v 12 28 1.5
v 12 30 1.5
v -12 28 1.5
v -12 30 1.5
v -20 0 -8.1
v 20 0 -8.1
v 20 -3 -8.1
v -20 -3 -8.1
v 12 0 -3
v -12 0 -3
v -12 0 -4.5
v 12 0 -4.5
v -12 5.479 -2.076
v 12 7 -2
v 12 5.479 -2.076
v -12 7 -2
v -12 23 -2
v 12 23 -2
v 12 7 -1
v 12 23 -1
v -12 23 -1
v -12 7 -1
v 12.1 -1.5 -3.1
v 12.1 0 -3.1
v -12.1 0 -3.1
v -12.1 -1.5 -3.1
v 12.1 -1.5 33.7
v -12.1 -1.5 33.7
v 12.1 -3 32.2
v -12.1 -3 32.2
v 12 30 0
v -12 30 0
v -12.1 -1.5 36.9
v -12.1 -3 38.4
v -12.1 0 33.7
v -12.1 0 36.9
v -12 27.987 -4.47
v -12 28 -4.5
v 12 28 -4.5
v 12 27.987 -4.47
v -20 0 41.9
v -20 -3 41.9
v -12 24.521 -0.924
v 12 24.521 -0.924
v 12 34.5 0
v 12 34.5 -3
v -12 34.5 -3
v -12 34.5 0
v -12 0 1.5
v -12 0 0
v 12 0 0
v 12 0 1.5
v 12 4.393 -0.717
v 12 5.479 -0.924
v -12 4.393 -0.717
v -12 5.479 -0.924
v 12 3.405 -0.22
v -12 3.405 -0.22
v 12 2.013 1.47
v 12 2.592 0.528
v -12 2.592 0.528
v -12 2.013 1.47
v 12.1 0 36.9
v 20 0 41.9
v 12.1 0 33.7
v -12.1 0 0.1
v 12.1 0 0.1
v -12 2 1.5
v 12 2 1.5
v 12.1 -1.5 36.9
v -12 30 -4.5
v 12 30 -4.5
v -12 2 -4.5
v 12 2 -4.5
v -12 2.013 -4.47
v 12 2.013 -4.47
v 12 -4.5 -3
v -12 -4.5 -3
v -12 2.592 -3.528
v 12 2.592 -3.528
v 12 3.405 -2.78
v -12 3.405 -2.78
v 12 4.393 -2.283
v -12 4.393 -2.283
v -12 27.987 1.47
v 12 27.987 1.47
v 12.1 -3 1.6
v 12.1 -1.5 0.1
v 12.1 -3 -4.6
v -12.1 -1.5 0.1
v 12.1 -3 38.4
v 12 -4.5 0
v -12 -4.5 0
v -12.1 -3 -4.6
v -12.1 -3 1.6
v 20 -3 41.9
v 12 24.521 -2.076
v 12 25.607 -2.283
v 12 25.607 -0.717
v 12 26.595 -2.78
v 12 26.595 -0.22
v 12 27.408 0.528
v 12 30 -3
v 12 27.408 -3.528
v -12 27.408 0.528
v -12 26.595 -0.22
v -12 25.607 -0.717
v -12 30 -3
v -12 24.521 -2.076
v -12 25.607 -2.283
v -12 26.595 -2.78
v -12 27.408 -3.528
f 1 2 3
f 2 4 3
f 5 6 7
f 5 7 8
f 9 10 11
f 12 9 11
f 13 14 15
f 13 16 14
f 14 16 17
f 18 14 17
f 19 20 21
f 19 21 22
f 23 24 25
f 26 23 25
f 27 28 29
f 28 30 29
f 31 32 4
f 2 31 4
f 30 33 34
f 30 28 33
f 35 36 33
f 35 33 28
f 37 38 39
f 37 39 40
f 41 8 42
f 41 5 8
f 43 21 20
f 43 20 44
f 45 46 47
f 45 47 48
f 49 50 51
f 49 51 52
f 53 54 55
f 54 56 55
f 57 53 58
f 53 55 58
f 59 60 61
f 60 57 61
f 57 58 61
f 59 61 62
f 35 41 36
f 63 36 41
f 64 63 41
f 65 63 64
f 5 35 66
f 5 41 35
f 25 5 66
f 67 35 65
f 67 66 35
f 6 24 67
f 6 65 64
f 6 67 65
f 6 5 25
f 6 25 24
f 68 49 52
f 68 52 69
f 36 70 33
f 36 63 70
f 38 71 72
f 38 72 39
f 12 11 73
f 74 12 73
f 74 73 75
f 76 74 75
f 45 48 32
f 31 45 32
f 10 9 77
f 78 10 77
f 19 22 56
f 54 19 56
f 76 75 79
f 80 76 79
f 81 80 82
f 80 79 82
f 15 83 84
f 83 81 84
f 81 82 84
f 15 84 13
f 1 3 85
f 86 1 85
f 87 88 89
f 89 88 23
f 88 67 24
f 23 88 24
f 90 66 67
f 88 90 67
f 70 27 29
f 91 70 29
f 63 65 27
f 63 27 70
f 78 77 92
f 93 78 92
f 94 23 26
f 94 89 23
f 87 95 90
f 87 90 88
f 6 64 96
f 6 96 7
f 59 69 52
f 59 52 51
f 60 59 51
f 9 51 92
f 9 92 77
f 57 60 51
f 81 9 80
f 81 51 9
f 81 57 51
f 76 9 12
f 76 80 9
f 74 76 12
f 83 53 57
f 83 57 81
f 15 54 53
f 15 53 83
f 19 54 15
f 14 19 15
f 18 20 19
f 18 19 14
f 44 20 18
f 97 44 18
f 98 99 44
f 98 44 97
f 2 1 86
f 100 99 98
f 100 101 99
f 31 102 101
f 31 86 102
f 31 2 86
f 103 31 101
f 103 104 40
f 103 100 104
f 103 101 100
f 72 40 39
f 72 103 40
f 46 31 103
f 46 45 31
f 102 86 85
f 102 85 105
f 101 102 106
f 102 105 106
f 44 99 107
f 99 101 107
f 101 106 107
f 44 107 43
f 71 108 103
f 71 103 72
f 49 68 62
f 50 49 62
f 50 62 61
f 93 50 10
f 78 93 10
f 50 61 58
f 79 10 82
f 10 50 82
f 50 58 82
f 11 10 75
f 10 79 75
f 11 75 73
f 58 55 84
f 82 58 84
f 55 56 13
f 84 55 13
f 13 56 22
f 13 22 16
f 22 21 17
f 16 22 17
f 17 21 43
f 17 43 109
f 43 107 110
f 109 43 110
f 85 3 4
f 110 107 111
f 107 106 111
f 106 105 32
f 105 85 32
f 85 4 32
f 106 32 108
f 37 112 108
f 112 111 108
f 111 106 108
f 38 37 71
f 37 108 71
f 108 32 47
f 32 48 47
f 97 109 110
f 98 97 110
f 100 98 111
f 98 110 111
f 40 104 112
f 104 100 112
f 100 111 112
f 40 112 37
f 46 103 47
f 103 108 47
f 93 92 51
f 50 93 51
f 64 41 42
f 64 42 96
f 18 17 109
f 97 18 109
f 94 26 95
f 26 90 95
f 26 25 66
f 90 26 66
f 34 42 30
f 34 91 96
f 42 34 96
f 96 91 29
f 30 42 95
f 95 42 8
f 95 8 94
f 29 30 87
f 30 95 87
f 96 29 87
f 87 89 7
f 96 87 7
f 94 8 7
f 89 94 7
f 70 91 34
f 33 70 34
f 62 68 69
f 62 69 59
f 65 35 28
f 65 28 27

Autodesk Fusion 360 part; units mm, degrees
sketch "Sketch1" plane through (0, 0, 0) normal (1, 0, 0) x (0, 0, -1)
  line L0 (0, 0) -> (3, 0)
  line L1 (3, 0) -> (3, -4.5)
  line L2 (3, -4.5) -> (0, -4.5)
  line L3 (0, -4.5) -> (0, 0)
  line L4 (3, 0) -> (4.5, 0)
  line L5 (1.5, 0) -> (1.5, 16.3106) construction
  line L6 (-3.4591, 15) -> (5.8046, 15) construction
  line L7 (2, 15) -> (2, 7)
  line L8 (2, 7) -> (2.2, 3.005)
  line L9 (4.5, 0) -> (4.5, 2)
  line L10 (4.5, 2) -> (2.2, 3.005)
  line L11 (0, 0) -> (-1.5, 0)
  line L12 (-1.5, 0) -> (-1.5, 2)
  line L13 (-1.5, 2) -> (0.8, 3.005)
  line L14 (1, 7) -> (0.8, 3.005)
  line L15 (1, 15) -> (1, 7)
  line L16 (3, 30) -> (4.5, 30)
  line L17 (1, 23) -> (0.8, 26.995)
  line L18 (2, 23) -> (2.2, 26.995)
  line L19 (1, 15) -> (1, 23)
  line L20 (4.5, 30) -> (4.5, 28)
  line L21 (2, 15) -> (2, 23)
  line L22 (3, 30) -> (3, 34.5)
  line L23 (-1.5, 28) -> (0.8, 26.995)
  line L24 (0, 34.5) -> (0, 30)
  line L25 (3, 34.5) -> (0, 34.5)
  line L26 (0, 30) -> (-1.5, 30)
  line L27 (-1.5, 30) -> (-1.5, 28)
  line L28 (0, 30) -> (3, 30)
  line L29 (4.5, 28) -> (2.2, 26.995)
  point P0 (0, 30)
  point P1 (1.5, 30)
  dimension "d1" = 3
  dimension "d2" = 4.5
  dimension "d3" = 1.5
  dimension "d5" = 15
  dimension "d6" = 8
  dimension "d7" = 4
  dimension "d8" = 0.5
  dimension "d9" = 0.7
  dimension "d10" = 2
extrude "Extrude1" add sketch "Sketch1" along normal mid plane 24 makes body 1
sketch "Sketch2" plane through (0, 0, 0) normal (0, 1, 0) x (1, 0, 0)
  line L0 (-12, 0) -> (12, 0)
  line L1 (12, 0) -> (12, 3)
  line L2 (12, 3) -> (-12, 3)
  line L3 (-12, 3) -> (-12, 0)
  line L4 (12.1, 3.1) -> (-12.1, 3.1)
  line L5 (-12.1, 3.1) -> (-12.1, -0.1)
  line L6 (-12.1, -0.1) -> (12.1, -0.1)
  line L7 (12.1, -0.1) -> (12.1, 3.1)
  line L8 (0, 0) -> (0, -36.4952) construction
  line L9 (20, 8.1) -> (-20, 8.1)
  line L10 (-20, 8.1) -> (-20, -41.9)
  line L11 (-20, -41.9) -> (20, -41.9)
  line L12 (20, -41.9) -> (20, 8.1)
  line L13 (20, 8.1) -> (-20, -41.9) construction
  line L14 (-20, 8.1) -> (20, -41.9) construction
  line L15 (0, -16.9) -> (-15.1957, -16.9) construction
  line L16 (-12.1, -33.7) -> (12.1, -33.7)
  line L17 (12.1, -33.7) -> (12.1, -36.9)
  line L18 (12.1, -36.9) -> (-12.1, -36.9)
  line L19 (-12.1, -36.9) -> (-12.1, -33.7)
  point P0 (0, -16.9)
  dimension "d13" = 0.1
  dimension "d14" = 40
  dimension "d15" = 50
  dimension "d16" = 5
extrude "Extrude2" add sketch "Sketch2" against normal blind 3 separate body contours L9 L10 L11 L12 makes body 2
chamfer "Chamfer1" distance 1.5 angle 45 4 edges at (0, -3, -3.1) (0, -3, 0.1) (0, -3, 33.7) (0, -3, 36.9) on bodies 2
fillet "Fillet1" radius 4 4 edges at (0, 3.005, -0.8) (0, 3.005, -2.2) (0, 26.995, -0.8) (0, 26.995, -2.2) on bodies 1
